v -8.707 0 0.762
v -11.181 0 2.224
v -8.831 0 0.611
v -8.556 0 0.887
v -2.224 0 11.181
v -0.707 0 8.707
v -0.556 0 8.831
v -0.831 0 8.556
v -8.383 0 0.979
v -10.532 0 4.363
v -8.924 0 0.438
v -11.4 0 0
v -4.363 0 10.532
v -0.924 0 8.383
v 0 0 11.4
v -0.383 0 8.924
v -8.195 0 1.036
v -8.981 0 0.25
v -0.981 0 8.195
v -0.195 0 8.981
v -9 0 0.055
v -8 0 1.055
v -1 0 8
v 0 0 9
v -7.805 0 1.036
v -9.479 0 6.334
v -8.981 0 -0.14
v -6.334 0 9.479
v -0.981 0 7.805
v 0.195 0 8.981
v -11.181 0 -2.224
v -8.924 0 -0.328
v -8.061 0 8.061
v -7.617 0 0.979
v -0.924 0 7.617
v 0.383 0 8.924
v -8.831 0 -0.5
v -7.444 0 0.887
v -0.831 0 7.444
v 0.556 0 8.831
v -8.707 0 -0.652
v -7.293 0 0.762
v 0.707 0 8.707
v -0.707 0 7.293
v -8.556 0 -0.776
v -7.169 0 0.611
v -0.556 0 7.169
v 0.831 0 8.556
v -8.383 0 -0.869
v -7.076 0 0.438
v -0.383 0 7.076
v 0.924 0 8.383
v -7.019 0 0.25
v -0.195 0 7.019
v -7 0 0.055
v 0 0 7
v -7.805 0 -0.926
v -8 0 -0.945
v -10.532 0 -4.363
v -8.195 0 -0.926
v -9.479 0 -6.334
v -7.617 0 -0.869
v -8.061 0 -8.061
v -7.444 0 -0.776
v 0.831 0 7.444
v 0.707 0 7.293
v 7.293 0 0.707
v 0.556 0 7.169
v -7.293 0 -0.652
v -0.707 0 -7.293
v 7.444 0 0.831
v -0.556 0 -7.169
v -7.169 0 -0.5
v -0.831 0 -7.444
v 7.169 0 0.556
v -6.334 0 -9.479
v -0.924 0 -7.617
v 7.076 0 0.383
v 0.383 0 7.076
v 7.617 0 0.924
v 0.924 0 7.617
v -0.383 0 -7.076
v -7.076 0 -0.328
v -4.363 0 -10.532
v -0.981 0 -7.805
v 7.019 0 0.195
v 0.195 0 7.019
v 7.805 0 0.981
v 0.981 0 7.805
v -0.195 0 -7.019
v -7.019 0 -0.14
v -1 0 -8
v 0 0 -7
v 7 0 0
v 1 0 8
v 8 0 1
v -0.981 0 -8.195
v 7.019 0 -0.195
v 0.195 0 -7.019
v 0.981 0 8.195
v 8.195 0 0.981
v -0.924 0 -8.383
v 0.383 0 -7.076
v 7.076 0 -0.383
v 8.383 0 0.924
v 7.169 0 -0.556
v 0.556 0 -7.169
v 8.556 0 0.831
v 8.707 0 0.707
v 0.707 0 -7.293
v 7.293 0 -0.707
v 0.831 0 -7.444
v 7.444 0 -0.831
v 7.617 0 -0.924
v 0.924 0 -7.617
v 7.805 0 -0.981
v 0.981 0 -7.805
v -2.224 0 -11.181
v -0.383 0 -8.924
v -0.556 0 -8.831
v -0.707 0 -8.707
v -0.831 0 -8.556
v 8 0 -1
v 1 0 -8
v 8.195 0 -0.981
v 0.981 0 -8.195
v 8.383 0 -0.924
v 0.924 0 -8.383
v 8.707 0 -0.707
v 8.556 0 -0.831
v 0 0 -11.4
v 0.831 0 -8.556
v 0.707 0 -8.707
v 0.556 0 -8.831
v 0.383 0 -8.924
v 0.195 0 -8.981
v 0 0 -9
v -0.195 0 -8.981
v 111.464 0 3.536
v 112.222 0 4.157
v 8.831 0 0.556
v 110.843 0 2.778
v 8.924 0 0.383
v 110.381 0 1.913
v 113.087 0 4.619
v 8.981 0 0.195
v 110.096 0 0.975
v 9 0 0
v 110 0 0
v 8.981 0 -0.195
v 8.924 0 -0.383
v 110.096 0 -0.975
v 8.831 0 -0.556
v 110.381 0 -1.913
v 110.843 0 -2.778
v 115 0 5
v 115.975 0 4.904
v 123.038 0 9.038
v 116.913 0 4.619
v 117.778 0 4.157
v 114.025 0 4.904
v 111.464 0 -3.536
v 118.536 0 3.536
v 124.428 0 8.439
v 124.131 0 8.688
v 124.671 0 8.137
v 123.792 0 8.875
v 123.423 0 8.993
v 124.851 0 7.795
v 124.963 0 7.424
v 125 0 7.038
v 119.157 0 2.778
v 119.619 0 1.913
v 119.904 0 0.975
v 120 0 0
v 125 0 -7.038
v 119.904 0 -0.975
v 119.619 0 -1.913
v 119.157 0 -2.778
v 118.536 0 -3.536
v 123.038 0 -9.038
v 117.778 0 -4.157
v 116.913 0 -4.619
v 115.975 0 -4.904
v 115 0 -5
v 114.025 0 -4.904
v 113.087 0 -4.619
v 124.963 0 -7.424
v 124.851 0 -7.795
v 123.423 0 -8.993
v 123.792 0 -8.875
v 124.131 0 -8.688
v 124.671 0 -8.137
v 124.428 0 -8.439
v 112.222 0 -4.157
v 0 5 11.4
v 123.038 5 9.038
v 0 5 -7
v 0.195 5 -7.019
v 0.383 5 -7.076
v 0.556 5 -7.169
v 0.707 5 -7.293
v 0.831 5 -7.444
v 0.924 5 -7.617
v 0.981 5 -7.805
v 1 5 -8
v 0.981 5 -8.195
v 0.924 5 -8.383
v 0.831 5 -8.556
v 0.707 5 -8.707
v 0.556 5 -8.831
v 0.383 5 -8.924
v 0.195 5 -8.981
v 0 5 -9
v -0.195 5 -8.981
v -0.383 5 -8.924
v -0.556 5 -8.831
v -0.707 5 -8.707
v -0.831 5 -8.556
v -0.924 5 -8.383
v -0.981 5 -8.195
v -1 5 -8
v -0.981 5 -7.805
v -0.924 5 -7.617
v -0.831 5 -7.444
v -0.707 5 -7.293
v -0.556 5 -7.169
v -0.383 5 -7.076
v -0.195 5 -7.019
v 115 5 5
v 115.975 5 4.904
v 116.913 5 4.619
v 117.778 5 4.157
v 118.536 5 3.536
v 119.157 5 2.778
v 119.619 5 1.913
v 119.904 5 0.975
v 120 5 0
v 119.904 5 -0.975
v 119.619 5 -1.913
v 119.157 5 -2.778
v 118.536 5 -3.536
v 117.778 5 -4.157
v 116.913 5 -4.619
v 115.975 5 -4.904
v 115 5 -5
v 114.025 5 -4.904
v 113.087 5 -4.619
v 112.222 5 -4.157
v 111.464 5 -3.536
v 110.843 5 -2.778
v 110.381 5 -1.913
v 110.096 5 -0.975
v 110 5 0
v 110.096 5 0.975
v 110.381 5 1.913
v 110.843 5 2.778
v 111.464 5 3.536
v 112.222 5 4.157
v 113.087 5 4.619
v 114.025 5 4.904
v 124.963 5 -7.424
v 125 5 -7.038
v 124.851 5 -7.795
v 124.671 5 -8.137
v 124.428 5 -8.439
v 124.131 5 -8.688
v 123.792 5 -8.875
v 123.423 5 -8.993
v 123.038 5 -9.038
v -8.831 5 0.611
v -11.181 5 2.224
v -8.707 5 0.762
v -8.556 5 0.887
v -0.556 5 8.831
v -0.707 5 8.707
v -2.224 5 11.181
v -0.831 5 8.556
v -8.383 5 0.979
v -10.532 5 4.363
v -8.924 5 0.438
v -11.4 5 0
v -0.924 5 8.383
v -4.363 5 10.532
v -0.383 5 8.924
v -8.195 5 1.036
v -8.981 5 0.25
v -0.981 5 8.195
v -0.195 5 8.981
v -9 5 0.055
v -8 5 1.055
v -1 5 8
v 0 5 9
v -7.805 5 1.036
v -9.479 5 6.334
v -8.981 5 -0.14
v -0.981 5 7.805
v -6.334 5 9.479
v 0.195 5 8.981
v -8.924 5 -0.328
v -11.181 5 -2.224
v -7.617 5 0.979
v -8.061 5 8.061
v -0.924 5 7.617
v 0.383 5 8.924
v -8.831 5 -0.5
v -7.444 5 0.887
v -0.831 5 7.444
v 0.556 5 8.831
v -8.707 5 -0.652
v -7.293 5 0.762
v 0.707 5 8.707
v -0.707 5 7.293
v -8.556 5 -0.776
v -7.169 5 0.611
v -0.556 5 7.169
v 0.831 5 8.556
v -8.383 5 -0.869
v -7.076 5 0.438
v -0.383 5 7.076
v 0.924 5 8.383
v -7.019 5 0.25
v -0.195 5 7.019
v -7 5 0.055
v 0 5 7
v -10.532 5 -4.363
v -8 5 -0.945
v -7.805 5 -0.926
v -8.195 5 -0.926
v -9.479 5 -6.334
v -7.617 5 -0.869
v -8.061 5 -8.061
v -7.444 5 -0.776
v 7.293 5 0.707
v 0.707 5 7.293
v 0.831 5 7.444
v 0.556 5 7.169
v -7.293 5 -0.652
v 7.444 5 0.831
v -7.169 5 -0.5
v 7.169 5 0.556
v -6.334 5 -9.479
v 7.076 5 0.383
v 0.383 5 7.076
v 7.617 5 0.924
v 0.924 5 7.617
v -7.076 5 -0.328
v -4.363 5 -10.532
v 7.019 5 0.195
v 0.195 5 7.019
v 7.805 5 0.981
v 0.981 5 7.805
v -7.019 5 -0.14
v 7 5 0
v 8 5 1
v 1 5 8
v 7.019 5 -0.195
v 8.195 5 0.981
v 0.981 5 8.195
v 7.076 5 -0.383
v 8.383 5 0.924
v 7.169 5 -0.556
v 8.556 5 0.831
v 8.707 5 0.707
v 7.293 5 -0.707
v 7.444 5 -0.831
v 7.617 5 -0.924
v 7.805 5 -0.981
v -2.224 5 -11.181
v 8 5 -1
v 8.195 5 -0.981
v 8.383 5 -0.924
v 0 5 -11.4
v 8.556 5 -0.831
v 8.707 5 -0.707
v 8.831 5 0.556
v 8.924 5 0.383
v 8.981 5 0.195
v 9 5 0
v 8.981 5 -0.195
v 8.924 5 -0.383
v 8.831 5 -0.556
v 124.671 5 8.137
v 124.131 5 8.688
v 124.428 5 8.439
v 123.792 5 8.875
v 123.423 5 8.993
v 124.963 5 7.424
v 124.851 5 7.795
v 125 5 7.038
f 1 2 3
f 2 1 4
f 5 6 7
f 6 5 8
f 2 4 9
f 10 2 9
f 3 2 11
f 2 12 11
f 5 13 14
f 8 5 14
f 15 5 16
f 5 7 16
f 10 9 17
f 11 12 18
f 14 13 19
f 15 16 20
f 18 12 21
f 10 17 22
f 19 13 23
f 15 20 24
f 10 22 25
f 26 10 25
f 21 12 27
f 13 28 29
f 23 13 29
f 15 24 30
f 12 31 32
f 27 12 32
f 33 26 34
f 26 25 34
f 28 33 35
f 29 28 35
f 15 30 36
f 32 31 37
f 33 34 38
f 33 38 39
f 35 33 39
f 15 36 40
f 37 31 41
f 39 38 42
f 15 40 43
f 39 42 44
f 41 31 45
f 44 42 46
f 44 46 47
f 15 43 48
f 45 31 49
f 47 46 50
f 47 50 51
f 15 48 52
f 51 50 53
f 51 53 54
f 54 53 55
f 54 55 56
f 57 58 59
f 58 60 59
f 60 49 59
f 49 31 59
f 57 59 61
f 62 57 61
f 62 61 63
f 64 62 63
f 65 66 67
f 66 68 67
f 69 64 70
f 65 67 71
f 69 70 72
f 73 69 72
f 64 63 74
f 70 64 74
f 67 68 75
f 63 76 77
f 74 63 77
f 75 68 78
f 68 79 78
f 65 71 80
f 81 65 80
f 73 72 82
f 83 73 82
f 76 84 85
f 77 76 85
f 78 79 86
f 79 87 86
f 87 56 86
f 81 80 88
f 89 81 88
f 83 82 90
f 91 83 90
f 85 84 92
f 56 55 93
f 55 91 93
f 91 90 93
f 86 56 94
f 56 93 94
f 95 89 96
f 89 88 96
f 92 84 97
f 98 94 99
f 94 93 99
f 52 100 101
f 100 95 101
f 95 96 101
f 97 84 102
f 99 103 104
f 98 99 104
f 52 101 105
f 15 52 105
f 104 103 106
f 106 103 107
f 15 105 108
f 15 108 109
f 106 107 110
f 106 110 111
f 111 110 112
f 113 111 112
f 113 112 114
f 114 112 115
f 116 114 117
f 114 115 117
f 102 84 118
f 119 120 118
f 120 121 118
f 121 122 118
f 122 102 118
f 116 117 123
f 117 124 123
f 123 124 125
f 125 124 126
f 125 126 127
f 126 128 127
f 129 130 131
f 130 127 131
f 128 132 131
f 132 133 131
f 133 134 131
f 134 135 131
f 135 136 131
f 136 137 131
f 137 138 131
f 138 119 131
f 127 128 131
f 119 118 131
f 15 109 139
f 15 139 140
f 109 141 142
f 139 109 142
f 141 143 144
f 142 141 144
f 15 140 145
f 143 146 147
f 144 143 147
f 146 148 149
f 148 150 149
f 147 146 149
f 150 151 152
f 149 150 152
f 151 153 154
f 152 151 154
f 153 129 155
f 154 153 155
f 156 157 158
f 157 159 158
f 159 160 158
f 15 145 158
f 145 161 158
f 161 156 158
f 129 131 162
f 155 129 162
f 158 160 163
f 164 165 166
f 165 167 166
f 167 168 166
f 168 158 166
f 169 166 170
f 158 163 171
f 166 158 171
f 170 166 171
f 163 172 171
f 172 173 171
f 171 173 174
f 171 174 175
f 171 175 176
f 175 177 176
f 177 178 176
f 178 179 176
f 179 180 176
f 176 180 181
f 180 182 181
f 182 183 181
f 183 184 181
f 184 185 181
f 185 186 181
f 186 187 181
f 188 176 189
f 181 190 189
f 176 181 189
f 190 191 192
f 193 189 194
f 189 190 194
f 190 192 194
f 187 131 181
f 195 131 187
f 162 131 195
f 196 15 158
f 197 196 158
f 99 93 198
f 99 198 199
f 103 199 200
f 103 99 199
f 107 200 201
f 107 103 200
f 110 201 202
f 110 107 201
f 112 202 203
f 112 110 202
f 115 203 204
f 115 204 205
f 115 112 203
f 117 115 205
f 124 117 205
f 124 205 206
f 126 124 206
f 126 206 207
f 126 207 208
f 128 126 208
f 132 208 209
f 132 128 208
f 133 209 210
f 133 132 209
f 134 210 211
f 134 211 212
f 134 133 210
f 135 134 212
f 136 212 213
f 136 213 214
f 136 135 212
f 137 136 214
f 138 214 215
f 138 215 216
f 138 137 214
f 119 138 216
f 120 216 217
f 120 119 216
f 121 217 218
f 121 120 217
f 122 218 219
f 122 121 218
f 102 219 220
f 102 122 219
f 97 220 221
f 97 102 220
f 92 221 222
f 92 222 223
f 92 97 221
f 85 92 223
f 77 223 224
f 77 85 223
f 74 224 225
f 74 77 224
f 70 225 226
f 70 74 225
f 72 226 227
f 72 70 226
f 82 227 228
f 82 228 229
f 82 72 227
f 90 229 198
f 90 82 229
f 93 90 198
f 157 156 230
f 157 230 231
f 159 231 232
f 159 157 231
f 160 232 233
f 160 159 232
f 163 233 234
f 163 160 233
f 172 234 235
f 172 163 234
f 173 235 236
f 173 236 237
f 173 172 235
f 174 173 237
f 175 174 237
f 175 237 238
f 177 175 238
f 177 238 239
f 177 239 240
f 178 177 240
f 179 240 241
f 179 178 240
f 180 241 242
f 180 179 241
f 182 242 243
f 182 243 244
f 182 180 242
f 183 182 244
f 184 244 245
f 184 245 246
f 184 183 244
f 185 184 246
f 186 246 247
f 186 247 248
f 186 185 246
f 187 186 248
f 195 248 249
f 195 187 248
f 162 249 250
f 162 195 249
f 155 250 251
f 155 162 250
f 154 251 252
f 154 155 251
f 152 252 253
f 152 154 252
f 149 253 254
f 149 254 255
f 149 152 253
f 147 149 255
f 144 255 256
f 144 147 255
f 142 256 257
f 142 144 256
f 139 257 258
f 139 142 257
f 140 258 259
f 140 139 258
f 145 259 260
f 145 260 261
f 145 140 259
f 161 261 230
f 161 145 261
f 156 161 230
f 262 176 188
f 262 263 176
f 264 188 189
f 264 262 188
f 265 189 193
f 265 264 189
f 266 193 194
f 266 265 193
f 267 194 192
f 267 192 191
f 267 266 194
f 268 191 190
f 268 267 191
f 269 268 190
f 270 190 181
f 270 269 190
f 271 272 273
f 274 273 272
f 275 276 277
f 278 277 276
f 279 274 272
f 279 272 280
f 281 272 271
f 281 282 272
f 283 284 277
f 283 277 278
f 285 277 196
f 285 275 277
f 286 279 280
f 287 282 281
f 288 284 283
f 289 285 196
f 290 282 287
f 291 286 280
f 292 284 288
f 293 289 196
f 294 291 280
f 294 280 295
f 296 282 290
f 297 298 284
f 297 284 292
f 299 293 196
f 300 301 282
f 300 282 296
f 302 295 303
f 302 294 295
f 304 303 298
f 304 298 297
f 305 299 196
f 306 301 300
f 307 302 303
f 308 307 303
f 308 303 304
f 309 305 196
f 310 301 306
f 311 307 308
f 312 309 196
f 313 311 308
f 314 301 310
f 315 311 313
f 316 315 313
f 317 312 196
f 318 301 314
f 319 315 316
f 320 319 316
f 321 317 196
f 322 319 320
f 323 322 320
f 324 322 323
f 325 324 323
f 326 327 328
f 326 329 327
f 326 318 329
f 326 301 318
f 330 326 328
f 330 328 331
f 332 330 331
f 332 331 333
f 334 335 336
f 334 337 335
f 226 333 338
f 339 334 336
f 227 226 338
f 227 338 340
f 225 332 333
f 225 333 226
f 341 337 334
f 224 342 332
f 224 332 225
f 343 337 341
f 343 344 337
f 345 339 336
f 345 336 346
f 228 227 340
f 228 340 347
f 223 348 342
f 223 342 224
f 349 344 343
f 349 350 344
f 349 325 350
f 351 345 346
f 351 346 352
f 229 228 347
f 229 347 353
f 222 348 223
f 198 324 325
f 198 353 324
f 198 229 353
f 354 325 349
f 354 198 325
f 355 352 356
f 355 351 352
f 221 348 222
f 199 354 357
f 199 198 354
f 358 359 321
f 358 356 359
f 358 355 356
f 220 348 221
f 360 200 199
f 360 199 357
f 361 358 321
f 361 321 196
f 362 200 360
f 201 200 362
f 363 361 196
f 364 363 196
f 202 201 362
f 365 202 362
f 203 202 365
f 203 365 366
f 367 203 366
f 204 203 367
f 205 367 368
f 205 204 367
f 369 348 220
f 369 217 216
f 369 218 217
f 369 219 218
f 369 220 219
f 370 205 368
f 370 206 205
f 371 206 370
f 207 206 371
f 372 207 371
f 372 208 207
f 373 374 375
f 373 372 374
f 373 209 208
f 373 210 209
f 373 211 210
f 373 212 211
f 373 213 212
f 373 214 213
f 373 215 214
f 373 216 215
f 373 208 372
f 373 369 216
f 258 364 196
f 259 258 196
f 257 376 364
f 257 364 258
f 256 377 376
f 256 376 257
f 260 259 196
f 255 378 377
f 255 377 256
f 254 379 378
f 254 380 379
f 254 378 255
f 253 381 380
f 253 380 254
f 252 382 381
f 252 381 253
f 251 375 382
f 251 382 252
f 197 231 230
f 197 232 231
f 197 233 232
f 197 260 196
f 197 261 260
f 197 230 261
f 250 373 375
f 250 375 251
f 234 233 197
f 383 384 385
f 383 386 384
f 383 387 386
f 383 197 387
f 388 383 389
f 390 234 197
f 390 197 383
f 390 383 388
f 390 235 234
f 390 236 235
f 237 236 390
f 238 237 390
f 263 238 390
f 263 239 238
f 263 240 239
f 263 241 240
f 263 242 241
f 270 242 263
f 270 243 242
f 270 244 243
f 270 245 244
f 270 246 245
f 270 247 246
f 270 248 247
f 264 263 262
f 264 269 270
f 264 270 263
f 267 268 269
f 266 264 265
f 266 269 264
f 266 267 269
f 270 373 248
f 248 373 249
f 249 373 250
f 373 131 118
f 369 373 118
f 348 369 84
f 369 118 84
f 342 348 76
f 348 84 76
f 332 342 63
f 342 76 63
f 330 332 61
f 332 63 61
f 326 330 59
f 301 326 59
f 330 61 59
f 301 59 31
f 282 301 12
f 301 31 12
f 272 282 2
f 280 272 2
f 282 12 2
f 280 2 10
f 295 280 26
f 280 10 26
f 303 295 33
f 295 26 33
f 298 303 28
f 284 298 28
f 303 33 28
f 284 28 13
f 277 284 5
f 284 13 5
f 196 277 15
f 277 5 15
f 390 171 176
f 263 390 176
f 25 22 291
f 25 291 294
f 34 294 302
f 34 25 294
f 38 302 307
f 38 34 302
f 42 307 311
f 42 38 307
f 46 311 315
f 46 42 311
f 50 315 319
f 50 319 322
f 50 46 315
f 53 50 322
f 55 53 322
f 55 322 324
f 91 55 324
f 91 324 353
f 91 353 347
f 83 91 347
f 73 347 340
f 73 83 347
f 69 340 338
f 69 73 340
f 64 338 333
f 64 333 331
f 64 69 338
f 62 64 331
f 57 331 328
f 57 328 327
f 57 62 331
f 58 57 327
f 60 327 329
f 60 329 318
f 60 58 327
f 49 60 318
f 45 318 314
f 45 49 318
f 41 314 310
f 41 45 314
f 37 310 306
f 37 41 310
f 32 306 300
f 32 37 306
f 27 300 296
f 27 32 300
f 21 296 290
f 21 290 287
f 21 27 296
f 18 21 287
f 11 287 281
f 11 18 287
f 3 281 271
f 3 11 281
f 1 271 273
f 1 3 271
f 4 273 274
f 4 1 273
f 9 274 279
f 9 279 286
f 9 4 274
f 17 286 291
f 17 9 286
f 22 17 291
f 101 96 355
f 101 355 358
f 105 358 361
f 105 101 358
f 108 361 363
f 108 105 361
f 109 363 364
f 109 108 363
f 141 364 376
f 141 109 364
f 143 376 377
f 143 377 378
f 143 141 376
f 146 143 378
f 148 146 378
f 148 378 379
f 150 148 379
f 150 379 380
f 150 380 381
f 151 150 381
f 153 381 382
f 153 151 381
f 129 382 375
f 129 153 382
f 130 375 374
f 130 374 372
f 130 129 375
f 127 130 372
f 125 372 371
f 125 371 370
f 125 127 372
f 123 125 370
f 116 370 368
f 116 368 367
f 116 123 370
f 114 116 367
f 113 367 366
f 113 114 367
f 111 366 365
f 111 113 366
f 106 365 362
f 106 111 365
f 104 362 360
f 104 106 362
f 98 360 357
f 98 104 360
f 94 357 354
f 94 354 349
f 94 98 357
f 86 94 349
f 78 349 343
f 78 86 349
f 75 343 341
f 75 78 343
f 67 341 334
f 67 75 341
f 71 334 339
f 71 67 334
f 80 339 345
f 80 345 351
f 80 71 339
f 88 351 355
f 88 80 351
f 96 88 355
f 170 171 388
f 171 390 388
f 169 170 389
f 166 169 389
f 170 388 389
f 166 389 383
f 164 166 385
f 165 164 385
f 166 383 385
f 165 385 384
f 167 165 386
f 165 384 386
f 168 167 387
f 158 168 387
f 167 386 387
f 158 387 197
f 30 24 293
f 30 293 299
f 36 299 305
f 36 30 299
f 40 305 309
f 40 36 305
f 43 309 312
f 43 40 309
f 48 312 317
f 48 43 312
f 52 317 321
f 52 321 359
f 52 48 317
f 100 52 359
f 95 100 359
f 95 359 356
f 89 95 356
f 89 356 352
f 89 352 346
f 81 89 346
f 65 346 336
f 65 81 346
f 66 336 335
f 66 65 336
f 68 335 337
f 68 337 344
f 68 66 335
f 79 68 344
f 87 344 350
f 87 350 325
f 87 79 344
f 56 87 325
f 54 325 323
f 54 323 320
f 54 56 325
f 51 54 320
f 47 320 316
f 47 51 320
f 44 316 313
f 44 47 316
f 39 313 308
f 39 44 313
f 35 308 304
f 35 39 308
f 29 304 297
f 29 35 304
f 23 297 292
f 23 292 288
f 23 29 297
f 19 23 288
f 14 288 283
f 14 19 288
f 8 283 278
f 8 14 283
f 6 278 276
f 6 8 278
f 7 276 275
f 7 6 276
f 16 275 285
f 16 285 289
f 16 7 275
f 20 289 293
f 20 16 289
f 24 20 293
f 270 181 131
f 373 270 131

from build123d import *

# Parameters (mm, degrees)
CROQUIS1_R              = 5
CROQUIS1_R_2            = 1
SALIENTE_EXTRUIR1_DEPTH = 5
REDONDEO1_R             = 2


with BuildPart() as part:
    # Croquis1 → Saliente-Extruir1 (new body)
    with BuildSketch(Plane(origin=(0, 0, 0), x_dir=(1, 0, 0), z_dir=(0, 1, 0))):
        with BuildLine():
            Line((125, -9), (125, 9))
            Line((125, 9), (0, 11.4))
            ThreePointArc((0, 11.4), (-11.4, 0), (0, -11.4))
            Line((0, -11.4), (125, -9))
        make_face()
        with Locations(Location((115, 0, 0), (0, 0, 270))):
            Circle(CROQUIS1_R, mode=Mode.SUBTRACT)
        with Locations(Location((-8, -0.055168642, 0), (0, 0, 270))):
            Circle(CROQUIS1_R_2, mode=Mode.SUBTRACT)
        with Locations(Location((0, -8, 0), (0, 0, 270))):
            Circle(CROQUIS1_R_2, mode=Mode.SUBTRACT)
        with Locations(Location((0, 8, 0), (0, 0, 270))):
            Circle(CROQUIS1_R_2, mode=Mode.SUBTRACT)
        with Locations(Location((8, 0, 0), (0, 0, 270))):
            Circle(CROQUIS1_R_2, mode=Mode.SUBTRACT)
    extrude(amount=SALIENTE_EXTRUIR1_DEPTH)

    # Redondeo1
    redondeo1_edges = [part.edges().sort_by_distance(p)[0] for p in [
        (125, 2.5, -9),
        (125, 2.5, 9),
    ]]
    fillet(redondeo1_edges, radius=REDONDEO1_R)


solid = part.part
